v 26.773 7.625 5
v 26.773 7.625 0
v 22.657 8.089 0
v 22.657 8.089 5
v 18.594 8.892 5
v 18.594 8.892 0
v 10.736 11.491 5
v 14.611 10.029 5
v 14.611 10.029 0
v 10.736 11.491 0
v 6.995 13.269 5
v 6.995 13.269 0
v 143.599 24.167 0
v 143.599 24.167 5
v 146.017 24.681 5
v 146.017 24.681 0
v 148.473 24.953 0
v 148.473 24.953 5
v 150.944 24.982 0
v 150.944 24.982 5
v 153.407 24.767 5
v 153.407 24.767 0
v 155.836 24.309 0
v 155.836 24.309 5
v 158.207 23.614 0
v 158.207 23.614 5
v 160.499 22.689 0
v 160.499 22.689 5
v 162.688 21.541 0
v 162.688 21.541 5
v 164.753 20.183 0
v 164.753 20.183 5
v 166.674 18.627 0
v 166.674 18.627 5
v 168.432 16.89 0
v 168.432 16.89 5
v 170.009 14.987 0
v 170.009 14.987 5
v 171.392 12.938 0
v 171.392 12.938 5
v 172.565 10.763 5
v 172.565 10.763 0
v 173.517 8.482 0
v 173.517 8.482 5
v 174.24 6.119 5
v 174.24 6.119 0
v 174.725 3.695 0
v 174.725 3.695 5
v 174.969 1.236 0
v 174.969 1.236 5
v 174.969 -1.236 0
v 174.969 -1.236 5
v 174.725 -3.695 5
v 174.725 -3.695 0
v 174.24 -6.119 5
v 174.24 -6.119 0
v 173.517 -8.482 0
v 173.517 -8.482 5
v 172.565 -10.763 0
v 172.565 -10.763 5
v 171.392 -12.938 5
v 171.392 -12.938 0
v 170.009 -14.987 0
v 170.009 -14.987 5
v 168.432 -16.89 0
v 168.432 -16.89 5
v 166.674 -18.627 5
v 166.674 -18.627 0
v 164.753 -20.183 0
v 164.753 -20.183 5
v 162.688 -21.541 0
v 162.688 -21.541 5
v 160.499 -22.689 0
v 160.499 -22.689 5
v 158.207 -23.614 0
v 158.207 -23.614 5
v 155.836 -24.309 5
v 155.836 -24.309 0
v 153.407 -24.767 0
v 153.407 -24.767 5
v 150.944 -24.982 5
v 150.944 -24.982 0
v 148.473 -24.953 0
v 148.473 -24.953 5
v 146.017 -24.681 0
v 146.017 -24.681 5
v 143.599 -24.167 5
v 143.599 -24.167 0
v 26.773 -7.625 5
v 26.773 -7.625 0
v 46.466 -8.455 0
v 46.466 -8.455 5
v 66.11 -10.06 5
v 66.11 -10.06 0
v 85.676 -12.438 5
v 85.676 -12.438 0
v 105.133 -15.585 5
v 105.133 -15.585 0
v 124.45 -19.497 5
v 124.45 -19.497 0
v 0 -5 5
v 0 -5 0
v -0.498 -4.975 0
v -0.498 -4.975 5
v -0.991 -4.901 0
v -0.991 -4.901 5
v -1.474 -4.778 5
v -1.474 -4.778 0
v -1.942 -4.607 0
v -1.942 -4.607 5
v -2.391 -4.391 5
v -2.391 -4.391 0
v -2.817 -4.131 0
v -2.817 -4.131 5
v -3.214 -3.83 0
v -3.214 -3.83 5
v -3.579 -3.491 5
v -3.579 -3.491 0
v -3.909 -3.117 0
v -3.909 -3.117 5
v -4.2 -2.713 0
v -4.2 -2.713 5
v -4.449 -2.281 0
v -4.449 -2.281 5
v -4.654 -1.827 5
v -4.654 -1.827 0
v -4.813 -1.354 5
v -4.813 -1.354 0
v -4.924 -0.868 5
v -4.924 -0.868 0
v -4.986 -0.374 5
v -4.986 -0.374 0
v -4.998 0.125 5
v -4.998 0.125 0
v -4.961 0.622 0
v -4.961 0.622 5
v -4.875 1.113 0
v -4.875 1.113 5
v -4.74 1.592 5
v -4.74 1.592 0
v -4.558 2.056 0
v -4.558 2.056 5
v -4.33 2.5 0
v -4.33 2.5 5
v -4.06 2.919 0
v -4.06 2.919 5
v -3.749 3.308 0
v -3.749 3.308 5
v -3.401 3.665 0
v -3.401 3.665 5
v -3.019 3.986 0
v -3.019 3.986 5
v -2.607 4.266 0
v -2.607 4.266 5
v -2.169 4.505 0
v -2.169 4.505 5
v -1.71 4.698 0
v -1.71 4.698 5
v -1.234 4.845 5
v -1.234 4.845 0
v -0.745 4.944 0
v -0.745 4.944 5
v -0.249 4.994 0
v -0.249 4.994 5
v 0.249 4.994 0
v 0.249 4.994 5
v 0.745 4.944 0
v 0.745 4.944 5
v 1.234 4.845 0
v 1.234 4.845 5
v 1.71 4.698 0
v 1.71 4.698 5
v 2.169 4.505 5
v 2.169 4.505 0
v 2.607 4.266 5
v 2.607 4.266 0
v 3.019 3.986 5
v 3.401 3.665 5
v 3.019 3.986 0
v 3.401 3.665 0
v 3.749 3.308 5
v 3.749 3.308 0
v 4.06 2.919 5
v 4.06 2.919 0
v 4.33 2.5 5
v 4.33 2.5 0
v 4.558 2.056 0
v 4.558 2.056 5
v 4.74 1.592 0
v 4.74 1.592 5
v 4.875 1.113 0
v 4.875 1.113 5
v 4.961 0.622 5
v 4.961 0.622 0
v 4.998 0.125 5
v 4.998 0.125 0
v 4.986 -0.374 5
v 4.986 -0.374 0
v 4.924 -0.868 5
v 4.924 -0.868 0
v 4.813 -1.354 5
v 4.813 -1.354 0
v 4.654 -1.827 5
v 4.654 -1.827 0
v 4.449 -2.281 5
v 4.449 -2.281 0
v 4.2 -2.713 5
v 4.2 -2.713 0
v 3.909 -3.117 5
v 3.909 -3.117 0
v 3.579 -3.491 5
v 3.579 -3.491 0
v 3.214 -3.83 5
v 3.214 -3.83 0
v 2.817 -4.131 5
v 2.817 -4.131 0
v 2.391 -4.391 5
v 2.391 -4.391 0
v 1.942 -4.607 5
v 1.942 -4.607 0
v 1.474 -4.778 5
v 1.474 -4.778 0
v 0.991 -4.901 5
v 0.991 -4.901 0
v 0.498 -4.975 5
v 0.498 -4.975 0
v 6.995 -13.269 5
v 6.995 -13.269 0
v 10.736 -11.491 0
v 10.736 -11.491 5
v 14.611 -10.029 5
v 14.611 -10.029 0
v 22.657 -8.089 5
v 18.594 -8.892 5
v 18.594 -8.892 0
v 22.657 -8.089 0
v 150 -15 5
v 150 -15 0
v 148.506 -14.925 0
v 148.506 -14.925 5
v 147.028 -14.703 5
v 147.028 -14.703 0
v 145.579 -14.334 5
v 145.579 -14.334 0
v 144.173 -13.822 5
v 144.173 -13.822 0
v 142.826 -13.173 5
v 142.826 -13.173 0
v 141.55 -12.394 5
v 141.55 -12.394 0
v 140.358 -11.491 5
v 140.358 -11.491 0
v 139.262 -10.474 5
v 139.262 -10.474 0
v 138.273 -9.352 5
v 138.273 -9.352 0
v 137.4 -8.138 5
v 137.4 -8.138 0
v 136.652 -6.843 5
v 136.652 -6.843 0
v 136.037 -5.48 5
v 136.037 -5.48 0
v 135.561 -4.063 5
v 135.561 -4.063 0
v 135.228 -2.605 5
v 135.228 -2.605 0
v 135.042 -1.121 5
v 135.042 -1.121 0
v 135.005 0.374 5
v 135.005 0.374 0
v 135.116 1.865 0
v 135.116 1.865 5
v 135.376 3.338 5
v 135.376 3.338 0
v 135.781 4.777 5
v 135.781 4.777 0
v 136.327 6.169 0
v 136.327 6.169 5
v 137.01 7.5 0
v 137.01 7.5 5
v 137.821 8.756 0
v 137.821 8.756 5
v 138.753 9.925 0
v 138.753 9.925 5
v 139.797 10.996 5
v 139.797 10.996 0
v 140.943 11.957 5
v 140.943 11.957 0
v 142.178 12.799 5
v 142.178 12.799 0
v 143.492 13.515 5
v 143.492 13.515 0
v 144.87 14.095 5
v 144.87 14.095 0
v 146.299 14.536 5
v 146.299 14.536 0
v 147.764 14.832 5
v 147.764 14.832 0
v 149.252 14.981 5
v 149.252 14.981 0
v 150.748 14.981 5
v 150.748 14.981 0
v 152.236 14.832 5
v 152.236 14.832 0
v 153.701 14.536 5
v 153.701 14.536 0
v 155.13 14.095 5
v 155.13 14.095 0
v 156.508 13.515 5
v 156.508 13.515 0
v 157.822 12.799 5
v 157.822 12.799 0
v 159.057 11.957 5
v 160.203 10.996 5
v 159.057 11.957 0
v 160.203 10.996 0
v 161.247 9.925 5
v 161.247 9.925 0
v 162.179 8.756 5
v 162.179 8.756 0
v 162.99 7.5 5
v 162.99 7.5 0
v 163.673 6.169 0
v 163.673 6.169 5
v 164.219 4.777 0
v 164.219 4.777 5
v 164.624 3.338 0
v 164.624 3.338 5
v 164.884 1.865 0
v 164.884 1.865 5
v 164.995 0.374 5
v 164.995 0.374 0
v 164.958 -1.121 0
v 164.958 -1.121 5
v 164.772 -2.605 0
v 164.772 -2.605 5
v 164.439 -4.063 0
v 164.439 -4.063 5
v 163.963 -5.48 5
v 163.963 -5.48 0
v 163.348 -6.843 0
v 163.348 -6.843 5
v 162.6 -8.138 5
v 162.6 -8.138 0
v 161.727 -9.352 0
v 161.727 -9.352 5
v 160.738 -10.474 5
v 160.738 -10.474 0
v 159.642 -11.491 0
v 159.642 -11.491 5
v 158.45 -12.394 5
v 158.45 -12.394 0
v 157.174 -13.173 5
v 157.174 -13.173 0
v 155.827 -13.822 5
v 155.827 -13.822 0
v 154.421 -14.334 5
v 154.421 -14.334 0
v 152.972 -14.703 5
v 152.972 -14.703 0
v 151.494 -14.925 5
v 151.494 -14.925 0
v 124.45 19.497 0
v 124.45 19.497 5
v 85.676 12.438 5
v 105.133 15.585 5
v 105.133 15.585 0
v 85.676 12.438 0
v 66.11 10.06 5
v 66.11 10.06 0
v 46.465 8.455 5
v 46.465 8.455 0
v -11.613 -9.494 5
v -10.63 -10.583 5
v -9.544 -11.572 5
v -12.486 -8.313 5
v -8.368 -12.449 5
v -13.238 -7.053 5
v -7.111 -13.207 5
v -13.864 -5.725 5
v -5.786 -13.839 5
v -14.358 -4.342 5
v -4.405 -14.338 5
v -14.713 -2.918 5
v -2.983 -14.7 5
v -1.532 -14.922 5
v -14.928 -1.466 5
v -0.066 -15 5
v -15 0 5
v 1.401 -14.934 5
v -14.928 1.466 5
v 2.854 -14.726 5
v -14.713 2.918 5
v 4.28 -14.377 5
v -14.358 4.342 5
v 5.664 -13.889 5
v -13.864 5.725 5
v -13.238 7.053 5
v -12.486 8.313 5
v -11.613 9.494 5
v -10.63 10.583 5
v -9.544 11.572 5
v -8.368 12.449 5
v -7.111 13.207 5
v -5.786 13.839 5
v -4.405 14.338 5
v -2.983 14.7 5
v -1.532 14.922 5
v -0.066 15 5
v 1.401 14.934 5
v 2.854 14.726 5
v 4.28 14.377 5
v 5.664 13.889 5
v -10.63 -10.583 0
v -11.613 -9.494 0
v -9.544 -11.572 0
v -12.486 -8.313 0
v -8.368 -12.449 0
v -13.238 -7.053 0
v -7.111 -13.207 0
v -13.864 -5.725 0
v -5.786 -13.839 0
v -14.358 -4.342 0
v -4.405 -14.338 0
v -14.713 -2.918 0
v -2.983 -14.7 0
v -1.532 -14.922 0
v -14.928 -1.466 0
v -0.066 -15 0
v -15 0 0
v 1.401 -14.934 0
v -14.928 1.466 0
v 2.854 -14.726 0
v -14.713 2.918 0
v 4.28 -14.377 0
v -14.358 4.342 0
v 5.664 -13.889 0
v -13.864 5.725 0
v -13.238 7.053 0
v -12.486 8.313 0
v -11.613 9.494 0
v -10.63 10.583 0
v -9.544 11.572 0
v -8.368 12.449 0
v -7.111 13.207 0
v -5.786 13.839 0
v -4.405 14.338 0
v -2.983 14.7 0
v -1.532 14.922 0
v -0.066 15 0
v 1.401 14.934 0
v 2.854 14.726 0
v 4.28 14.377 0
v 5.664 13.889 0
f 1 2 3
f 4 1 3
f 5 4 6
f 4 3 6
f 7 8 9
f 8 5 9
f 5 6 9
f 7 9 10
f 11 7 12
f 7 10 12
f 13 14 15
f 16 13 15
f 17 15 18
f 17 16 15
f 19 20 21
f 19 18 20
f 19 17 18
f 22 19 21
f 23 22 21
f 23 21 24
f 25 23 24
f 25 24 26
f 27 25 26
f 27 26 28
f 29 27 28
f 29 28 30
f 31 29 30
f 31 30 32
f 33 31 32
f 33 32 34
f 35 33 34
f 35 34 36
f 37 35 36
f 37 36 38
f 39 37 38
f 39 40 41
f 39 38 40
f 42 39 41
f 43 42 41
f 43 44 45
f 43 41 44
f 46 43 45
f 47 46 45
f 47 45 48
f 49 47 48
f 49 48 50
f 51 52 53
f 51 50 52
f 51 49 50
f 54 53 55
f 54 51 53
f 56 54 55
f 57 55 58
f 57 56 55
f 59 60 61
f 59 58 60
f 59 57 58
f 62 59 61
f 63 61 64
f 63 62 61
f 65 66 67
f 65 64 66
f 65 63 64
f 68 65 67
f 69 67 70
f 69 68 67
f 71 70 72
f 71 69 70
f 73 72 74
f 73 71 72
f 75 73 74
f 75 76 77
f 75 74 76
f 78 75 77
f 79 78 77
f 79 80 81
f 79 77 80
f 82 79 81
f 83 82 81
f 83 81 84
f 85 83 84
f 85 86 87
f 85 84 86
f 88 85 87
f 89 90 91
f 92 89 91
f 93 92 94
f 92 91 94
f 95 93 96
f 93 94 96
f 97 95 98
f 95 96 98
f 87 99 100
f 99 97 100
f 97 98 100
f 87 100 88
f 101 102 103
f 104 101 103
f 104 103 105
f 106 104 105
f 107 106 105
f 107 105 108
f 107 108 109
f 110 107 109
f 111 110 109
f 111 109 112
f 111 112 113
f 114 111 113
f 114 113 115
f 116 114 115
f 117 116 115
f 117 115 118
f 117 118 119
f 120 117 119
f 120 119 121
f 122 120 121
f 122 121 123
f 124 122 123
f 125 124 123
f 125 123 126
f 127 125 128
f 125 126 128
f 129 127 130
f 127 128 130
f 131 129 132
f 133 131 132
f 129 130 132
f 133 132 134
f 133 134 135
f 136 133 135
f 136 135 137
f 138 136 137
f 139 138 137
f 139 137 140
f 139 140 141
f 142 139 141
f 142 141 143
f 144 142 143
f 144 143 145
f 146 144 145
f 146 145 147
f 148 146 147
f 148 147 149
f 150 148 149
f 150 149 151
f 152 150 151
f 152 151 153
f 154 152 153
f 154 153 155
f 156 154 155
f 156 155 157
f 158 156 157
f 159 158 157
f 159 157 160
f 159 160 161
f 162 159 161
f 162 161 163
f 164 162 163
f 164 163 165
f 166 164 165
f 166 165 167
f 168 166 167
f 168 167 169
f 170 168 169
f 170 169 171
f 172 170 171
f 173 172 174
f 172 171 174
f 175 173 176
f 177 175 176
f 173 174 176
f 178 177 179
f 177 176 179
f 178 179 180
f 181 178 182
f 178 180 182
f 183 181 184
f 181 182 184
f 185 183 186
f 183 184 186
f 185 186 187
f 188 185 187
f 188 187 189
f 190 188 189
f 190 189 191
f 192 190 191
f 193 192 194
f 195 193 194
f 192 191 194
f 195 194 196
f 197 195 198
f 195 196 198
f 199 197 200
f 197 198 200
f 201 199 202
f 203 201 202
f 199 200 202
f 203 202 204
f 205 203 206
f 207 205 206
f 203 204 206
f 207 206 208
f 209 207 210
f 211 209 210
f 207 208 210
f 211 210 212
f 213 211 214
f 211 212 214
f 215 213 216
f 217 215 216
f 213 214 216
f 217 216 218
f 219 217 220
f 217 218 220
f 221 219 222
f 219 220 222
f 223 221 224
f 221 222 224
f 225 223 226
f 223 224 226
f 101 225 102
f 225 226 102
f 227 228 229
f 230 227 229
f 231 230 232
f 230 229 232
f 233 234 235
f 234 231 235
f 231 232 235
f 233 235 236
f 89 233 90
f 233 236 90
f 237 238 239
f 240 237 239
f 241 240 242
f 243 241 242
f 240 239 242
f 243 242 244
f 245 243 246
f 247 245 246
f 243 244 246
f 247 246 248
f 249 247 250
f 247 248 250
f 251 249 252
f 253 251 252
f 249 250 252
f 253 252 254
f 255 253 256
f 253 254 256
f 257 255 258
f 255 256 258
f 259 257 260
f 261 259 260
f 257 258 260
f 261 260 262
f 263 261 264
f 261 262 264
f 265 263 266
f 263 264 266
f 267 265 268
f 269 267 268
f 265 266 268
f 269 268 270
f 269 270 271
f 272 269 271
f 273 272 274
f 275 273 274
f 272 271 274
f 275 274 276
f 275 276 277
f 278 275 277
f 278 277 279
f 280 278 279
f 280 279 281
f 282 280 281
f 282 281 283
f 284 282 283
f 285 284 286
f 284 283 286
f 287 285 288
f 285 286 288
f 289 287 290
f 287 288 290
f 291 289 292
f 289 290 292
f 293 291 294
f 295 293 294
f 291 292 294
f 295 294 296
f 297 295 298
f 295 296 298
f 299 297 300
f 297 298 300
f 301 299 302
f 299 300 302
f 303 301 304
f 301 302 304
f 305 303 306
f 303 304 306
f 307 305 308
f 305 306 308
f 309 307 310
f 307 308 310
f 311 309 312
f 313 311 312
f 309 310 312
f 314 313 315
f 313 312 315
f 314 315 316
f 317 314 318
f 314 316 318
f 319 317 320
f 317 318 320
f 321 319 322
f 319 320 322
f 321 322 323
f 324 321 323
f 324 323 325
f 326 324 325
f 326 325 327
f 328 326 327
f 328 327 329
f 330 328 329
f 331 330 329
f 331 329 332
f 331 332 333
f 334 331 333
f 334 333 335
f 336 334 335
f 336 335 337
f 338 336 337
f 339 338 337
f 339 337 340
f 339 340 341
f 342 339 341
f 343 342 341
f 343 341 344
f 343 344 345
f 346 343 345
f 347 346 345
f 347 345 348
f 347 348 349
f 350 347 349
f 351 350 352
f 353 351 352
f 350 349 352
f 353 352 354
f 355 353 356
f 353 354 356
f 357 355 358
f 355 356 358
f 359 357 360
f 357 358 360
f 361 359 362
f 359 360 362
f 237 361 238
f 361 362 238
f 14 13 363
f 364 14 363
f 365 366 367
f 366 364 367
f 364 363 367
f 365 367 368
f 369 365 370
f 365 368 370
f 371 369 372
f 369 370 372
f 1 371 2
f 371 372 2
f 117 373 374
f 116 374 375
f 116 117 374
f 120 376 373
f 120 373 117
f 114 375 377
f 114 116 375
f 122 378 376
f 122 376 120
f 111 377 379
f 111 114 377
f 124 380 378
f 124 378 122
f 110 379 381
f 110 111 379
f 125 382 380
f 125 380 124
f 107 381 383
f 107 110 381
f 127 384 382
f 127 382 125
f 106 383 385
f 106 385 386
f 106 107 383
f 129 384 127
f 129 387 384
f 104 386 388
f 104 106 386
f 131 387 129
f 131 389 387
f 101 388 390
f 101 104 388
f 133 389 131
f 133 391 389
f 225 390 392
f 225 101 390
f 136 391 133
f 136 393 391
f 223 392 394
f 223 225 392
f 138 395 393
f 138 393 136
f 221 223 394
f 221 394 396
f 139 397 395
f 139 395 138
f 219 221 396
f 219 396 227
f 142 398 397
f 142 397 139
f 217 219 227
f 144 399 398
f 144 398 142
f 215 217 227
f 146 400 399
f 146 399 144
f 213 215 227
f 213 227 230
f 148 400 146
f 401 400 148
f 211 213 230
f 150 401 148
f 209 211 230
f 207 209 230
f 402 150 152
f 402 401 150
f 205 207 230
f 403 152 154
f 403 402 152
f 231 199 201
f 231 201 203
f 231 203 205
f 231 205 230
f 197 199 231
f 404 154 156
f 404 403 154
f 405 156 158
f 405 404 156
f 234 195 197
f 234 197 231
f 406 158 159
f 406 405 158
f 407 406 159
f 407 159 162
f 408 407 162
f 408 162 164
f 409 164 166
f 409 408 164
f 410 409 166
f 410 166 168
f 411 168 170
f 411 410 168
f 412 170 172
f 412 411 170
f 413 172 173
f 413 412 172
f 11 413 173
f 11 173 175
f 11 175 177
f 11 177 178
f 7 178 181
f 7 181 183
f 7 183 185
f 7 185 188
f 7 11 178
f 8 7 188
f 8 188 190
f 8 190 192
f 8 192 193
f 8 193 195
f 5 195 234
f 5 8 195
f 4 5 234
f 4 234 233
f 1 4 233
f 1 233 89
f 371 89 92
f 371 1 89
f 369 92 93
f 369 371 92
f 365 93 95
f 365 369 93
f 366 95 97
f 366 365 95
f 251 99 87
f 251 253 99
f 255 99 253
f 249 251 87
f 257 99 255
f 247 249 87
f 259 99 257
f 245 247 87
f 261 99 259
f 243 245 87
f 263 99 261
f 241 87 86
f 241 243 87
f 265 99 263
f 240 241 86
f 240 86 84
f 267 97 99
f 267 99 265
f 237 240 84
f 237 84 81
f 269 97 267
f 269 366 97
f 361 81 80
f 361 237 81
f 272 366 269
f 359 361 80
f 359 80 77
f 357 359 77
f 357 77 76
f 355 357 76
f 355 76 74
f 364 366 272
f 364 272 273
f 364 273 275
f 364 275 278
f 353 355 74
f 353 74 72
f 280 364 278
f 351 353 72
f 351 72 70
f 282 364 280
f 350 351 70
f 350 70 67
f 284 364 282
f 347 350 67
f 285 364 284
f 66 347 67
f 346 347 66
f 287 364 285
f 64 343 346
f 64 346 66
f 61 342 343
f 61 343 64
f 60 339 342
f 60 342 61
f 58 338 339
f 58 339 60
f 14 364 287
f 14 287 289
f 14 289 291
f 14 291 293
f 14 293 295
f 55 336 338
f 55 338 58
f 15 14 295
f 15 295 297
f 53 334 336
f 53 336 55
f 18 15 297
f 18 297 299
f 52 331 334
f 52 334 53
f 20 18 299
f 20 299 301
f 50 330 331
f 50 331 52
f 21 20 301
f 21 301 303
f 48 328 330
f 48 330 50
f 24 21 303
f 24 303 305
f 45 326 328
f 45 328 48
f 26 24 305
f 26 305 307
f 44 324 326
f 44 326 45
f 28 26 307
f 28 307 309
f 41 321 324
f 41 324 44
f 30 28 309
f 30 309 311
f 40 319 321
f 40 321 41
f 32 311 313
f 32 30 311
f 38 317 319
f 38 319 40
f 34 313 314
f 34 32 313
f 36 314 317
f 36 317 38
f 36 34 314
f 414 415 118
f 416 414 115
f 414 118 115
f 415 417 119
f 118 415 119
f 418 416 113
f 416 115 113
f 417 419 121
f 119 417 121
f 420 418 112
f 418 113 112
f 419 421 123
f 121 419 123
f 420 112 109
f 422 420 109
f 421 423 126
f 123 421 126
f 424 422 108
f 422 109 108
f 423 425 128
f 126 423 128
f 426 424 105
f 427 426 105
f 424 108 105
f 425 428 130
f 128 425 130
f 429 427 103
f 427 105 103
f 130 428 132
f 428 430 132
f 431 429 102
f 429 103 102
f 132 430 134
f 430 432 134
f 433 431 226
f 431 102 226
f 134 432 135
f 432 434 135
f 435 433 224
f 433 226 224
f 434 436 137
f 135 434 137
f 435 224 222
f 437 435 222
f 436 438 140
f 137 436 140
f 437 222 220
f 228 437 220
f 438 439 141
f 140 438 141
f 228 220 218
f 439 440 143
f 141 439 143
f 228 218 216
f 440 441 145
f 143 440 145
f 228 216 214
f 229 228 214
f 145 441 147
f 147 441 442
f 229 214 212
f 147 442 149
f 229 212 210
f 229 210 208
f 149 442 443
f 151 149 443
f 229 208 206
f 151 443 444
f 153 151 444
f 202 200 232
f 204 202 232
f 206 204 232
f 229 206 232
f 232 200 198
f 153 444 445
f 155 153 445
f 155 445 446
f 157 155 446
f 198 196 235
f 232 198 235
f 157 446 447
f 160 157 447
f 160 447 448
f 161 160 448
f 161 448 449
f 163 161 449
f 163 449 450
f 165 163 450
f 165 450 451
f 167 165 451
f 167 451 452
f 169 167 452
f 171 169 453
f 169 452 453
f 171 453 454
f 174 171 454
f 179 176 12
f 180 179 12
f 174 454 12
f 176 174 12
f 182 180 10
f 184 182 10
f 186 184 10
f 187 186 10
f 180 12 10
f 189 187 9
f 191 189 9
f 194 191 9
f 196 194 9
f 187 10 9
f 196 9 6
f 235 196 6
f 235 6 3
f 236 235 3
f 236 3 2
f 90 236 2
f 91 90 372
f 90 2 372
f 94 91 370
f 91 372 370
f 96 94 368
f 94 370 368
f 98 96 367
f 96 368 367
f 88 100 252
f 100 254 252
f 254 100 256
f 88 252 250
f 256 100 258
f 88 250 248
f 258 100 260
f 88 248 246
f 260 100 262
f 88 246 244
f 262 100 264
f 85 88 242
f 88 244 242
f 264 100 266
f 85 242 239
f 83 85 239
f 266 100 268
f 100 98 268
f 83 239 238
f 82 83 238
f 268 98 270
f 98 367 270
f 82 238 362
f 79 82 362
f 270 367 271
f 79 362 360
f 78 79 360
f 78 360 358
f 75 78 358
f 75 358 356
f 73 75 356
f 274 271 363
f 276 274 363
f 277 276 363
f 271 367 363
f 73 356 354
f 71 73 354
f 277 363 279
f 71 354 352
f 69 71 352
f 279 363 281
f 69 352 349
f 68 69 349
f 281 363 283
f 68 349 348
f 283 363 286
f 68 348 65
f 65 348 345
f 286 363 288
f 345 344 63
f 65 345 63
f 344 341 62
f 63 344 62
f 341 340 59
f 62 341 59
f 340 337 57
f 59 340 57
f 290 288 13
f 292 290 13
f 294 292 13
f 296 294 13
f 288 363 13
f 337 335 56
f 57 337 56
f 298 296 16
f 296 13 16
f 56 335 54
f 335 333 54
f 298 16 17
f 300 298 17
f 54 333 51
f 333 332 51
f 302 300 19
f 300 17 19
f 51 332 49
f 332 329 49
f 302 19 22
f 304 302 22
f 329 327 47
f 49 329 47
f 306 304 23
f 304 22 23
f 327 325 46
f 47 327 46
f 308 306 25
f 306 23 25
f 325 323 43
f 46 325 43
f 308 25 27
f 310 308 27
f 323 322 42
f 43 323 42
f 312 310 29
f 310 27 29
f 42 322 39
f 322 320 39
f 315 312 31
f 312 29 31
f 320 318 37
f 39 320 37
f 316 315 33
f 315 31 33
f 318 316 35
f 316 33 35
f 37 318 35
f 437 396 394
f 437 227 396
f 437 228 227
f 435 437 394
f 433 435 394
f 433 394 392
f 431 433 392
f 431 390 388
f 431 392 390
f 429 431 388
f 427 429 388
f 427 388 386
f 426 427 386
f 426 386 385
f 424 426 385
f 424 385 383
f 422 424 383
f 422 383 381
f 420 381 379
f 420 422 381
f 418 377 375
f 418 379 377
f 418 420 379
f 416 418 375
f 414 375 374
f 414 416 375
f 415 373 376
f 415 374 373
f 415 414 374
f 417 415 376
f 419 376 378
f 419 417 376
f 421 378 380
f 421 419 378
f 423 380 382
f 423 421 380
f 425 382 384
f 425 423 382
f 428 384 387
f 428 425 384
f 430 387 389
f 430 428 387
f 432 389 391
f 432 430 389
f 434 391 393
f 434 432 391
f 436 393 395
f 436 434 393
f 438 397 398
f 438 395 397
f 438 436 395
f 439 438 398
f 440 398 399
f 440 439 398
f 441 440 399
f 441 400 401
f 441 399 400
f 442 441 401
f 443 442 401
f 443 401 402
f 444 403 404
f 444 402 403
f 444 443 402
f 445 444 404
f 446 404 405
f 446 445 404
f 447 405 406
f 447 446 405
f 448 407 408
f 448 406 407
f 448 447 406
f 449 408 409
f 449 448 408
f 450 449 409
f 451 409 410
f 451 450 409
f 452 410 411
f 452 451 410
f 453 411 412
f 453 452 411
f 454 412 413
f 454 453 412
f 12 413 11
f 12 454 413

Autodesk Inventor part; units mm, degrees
ref_plane "YZ Plane" through (0, 0, 0) normal (1, 0, 0) x (0, 1, 0)
ref_plane "XZ Plane" through (0, 0, 0) normal (0, 1, 0) x (-1, 0, 0)
ref_plane "XY Plane" through (0, 0, 0) normal (0, 0, 1) x (1, 0, 0)
sketch "Эскиз1" plane through (0, 0, 0) normal (0, 0, 1) x (1, 0, 0)
  arc A0 (6.9948, 13.2692) -> (6.9948, -13.2692) centre (0, 0) ccw
  line L0 (30.3109, 7.5) -> (15.5799, 7.5)
  line L1 (30.3109, -7.5) -> (15.5799, -7.5)
  arc A1 (143.599, -24.1667) -> (143.599, 24.1667) centre (150, 0) ccw
  arc A2 (6.9948, 13.2692) -> (30.3109, 7.5) centre (30.3109, 57.5) ccw
  arc A3 (30.3109, -7.5) -> (6.9948, -13.2692) centre (30.3109, -57.5) ccw
  arc A4 (15.5799, 7.5) -> (143.599, 24.1667) centre (15.5799, 507.5) ccw
  arc A5 (143.599, -24.1667) -> (15.5799, -7.5) centre (15.5799, -507.5) ccw
  point P0 (12.9904, 7.5)
  point P1 (126.1515, 7.5)
  point P2 (12.9904, -7.5)
  point P3 (126.1515, -7.5)
  point P4 (-12.9904, 7.5)
  point P5 (-12.9904, -7.5)
  point P6 (126.1515, -7.5)
  point P7 (126.1515, 7.5)
  point P8 (12.9904, 7.5)
  point P9 (12.9904, -7.5)
  point P10 (26.7733, 7.6253)
  point P11 (26.7733, -7.6253)
  dimension "d0" = 30
  dimension "d1" = 50
  dimension "d5" = 150
  dimension "d17" = 15
  dimension "d19" = 50
  dimension "d20" = 500
extrude "Выдавливание1" add sketch "Эскиз1" along normal blind 5 contours A5 L1 A3 | A2 L0 A4 | A2 A4 A1 A5 A3 A0
sketch "Эскиз2" plane through (0, 0, 5) normal (0, 0, 1) x (1, 0, 0)
  arc A0 (143.599, -24.1667) -> (143.599, 24.1667) centre (150, 0) ccw projected
  point P0 (0, 0)
  point P1 (0, 0)
  point P2 (88.8197, -10)
  point P3 (88.8197, 10)
  point P4 (142.2738, -12.8571)
  point P5 (142.2738, 12.8571)
hole "Отверстие1" at (0, 0, 5) direction (0, 0, -1) diameter 10 end through all
sketch "Эскиз3" plane through (0, 0, 5) normal (0, 0, 1) x (1, 0, 0)
  arc A0 (143.599, -24.1667) -> (143.599, 24.1667) centre (150, 0) ccw projected
  point P0 (0, 0)
hole "Отверстие2" at (150, 0, 5) direction (0, 0, -1) diameter 30 end through all
properties part number "Рычаг_1"
